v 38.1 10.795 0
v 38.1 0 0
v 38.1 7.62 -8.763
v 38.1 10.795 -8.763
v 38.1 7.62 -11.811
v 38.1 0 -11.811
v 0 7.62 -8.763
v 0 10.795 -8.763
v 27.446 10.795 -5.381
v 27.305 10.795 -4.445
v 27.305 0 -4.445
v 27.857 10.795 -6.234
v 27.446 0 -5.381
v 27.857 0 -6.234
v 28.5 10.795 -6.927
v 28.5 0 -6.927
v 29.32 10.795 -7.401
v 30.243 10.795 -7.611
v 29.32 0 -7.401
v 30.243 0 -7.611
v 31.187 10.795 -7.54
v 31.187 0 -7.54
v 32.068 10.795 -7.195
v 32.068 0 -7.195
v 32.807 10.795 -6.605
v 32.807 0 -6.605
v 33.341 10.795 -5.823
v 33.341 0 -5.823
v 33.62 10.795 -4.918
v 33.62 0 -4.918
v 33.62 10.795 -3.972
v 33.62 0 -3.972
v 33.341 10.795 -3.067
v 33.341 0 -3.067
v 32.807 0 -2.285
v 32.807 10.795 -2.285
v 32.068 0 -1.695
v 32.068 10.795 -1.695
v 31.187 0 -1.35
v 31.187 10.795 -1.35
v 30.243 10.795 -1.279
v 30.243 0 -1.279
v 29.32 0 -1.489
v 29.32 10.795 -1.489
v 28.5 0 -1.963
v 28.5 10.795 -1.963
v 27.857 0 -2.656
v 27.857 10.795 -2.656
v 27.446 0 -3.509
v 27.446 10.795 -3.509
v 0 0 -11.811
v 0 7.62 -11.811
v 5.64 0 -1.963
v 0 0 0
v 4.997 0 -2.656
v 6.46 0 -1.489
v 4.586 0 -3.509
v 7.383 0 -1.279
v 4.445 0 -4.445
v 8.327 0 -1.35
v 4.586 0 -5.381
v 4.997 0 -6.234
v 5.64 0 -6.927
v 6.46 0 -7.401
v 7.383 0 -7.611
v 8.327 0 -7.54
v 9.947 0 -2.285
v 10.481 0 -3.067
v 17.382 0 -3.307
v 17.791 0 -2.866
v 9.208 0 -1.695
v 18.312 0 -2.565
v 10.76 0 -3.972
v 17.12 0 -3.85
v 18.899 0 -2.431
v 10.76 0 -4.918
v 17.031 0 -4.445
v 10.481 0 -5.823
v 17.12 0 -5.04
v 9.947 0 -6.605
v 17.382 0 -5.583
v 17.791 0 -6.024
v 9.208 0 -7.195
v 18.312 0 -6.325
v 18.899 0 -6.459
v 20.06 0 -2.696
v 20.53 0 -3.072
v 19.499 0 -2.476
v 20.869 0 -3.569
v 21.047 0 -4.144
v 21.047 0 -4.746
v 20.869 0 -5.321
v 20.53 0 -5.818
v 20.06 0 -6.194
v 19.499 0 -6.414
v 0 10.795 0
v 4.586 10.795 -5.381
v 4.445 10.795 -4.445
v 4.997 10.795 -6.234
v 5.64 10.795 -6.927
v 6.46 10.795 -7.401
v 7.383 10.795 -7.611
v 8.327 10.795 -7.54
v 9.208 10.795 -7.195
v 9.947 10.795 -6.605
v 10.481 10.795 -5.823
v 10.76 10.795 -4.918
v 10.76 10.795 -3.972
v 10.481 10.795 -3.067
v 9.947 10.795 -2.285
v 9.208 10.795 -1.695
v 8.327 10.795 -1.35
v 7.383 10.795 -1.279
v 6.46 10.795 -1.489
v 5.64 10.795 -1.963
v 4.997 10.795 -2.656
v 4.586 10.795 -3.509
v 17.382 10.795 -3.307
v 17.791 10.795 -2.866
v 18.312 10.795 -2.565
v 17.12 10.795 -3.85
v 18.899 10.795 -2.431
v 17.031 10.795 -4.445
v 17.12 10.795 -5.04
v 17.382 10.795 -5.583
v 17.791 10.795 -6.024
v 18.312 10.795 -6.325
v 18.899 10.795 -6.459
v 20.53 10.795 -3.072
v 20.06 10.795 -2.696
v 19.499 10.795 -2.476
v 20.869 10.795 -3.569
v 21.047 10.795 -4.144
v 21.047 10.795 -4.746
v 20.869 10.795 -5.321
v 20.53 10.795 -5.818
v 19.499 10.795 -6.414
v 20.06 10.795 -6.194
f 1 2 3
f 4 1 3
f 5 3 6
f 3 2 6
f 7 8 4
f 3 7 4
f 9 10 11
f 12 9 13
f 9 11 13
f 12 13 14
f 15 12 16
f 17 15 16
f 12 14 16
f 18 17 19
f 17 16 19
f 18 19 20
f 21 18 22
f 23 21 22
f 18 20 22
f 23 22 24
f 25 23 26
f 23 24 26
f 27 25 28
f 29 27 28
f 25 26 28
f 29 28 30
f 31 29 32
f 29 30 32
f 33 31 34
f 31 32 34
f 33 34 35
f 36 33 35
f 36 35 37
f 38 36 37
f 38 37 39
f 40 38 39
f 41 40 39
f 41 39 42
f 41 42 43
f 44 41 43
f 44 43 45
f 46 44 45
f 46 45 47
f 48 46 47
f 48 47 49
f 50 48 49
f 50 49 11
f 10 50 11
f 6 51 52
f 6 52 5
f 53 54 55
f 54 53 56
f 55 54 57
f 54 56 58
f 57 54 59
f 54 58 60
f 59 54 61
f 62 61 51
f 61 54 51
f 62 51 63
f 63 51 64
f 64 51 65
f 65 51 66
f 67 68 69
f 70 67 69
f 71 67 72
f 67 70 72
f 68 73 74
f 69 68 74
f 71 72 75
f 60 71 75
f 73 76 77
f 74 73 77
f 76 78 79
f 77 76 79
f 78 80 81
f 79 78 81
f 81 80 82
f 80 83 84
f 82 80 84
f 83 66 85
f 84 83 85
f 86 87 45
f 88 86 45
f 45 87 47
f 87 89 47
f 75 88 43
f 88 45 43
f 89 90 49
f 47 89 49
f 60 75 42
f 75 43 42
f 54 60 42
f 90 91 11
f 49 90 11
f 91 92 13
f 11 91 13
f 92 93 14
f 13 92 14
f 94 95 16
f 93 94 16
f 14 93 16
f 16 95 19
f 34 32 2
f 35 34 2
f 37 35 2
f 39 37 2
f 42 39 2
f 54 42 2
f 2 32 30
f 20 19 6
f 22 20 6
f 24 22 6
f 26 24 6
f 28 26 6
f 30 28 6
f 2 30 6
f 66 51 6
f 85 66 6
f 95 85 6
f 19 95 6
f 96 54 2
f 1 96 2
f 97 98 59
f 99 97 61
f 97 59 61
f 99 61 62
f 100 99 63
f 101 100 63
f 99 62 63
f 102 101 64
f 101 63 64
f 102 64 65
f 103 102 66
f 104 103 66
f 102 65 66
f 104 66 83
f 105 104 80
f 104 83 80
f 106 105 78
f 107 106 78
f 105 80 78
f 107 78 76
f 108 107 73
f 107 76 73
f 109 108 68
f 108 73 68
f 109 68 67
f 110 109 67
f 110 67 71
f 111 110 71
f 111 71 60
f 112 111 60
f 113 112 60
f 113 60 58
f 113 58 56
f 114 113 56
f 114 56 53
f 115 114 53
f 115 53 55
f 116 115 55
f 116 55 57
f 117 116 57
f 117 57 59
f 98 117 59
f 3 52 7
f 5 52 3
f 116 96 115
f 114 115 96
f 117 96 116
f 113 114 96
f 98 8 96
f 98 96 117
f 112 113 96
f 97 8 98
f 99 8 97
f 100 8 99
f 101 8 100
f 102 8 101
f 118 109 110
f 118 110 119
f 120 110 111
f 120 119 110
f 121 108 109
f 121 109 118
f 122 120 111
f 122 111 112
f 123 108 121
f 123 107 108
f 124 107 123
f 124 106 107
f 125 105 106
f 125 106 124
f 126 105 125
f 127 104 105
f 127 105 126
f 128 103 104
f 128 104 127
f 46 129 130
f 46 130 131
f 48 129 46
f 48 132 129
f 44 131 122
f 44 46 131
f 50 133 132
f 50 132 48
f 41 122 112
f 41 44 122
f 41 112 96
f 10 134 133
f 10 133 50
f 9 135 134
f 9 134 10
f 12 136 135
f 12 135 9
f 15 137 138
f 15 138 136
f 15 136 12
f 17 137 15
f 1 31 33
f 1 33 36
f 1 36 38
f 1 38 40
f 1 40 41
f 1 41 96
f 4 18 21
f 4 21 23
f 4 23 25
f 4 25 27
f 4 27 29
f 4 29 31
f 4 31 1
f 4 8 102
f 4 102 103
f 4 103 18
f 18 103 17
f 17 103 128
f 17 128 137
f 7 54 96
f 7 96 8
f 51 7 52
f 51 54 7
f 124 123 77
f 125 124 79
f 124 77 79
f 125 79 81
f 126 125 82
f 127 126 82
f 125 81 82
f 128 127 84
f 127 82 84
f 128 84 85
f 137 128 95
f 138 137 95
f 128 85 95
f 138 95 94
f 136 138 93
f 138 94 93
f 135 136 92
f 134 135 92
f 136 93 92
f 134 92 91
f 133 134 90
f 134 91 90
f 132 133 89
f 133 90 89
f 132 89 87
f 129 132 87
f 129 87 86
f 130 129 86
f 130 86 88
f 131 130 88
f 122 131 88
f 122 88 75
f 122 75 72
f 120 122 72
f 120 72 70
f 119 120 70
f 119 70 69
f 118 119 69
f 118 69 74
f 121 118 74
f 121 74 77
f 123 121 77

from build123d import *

# Parameters (mm, degrees)
SKETCH1_W                      = 38.1
SKETCH1_H                      = 11.811
BOSS_EXTRUDE1_DEPTH            = 10.795
SKETCH2_W                      = 38.1
SKETCH2_H                      = 3.048
CUT_EXTRUDE1_DEPTH             = 3.175
F_1_4_0_25_PRESS_DOWEL_HOLE1_D = 6.35
F_10_32_TAPPED_HOLE1_D         = 4.0386


with BuildPart() as part:
    # Sketch1 → Boss-Extrude1 (new body)
    with BuildSketch(Plane(origin=(0, 0, 0), x_dir=(1, 0, 0), z_dir=(0, 1, 0))):
        with Locations((19.05, 5.9055)):
            Rectangle(SKETCH1_W, SKETCH1_H)
    extrude(amount=BOSS_EXTRUDE1_DEPTH)

    # Sketch2 → Cut-Extrude1 (cut)
    with BuildSketch(Plane(origin=(0, 10.795, 0), x_dir=(1, 0, 0), z_dir=(0, 1, 0))):
        with Locations((19.05, 10.287)):
            Rectangle(SKETCH2_W, SKETCH2_H)
    extrude(amount=-CUT_EXTRUDE1_DEPTH, mode=Mode.SUBTRACT)

    # 1/4 (0.25) Press Dowel Hole1 (through all)
    with Locations(Plane(origin=(0, 10.795, 0), x_dir=(1, 0, 0), z_dir=(0, 1, 0))):
        with Locations((7.62, 4.445), (30.48, 4.445)):
            Hole(F_1_4_0_25_PRESS_DOWEL_HOLE1_D / 2)

    # #10-32 Tapped Hole1 (through all)
    with Locations(Plane(origin=(0, 10.795, 0), x_dir=(1, 0, 0), z_dir=(0, 1, 0))):
        with Locations((19.05, 4.445)):
            Hole(F_10_32_TAPPED_HOLE1_D / 2)


solid = part.part
